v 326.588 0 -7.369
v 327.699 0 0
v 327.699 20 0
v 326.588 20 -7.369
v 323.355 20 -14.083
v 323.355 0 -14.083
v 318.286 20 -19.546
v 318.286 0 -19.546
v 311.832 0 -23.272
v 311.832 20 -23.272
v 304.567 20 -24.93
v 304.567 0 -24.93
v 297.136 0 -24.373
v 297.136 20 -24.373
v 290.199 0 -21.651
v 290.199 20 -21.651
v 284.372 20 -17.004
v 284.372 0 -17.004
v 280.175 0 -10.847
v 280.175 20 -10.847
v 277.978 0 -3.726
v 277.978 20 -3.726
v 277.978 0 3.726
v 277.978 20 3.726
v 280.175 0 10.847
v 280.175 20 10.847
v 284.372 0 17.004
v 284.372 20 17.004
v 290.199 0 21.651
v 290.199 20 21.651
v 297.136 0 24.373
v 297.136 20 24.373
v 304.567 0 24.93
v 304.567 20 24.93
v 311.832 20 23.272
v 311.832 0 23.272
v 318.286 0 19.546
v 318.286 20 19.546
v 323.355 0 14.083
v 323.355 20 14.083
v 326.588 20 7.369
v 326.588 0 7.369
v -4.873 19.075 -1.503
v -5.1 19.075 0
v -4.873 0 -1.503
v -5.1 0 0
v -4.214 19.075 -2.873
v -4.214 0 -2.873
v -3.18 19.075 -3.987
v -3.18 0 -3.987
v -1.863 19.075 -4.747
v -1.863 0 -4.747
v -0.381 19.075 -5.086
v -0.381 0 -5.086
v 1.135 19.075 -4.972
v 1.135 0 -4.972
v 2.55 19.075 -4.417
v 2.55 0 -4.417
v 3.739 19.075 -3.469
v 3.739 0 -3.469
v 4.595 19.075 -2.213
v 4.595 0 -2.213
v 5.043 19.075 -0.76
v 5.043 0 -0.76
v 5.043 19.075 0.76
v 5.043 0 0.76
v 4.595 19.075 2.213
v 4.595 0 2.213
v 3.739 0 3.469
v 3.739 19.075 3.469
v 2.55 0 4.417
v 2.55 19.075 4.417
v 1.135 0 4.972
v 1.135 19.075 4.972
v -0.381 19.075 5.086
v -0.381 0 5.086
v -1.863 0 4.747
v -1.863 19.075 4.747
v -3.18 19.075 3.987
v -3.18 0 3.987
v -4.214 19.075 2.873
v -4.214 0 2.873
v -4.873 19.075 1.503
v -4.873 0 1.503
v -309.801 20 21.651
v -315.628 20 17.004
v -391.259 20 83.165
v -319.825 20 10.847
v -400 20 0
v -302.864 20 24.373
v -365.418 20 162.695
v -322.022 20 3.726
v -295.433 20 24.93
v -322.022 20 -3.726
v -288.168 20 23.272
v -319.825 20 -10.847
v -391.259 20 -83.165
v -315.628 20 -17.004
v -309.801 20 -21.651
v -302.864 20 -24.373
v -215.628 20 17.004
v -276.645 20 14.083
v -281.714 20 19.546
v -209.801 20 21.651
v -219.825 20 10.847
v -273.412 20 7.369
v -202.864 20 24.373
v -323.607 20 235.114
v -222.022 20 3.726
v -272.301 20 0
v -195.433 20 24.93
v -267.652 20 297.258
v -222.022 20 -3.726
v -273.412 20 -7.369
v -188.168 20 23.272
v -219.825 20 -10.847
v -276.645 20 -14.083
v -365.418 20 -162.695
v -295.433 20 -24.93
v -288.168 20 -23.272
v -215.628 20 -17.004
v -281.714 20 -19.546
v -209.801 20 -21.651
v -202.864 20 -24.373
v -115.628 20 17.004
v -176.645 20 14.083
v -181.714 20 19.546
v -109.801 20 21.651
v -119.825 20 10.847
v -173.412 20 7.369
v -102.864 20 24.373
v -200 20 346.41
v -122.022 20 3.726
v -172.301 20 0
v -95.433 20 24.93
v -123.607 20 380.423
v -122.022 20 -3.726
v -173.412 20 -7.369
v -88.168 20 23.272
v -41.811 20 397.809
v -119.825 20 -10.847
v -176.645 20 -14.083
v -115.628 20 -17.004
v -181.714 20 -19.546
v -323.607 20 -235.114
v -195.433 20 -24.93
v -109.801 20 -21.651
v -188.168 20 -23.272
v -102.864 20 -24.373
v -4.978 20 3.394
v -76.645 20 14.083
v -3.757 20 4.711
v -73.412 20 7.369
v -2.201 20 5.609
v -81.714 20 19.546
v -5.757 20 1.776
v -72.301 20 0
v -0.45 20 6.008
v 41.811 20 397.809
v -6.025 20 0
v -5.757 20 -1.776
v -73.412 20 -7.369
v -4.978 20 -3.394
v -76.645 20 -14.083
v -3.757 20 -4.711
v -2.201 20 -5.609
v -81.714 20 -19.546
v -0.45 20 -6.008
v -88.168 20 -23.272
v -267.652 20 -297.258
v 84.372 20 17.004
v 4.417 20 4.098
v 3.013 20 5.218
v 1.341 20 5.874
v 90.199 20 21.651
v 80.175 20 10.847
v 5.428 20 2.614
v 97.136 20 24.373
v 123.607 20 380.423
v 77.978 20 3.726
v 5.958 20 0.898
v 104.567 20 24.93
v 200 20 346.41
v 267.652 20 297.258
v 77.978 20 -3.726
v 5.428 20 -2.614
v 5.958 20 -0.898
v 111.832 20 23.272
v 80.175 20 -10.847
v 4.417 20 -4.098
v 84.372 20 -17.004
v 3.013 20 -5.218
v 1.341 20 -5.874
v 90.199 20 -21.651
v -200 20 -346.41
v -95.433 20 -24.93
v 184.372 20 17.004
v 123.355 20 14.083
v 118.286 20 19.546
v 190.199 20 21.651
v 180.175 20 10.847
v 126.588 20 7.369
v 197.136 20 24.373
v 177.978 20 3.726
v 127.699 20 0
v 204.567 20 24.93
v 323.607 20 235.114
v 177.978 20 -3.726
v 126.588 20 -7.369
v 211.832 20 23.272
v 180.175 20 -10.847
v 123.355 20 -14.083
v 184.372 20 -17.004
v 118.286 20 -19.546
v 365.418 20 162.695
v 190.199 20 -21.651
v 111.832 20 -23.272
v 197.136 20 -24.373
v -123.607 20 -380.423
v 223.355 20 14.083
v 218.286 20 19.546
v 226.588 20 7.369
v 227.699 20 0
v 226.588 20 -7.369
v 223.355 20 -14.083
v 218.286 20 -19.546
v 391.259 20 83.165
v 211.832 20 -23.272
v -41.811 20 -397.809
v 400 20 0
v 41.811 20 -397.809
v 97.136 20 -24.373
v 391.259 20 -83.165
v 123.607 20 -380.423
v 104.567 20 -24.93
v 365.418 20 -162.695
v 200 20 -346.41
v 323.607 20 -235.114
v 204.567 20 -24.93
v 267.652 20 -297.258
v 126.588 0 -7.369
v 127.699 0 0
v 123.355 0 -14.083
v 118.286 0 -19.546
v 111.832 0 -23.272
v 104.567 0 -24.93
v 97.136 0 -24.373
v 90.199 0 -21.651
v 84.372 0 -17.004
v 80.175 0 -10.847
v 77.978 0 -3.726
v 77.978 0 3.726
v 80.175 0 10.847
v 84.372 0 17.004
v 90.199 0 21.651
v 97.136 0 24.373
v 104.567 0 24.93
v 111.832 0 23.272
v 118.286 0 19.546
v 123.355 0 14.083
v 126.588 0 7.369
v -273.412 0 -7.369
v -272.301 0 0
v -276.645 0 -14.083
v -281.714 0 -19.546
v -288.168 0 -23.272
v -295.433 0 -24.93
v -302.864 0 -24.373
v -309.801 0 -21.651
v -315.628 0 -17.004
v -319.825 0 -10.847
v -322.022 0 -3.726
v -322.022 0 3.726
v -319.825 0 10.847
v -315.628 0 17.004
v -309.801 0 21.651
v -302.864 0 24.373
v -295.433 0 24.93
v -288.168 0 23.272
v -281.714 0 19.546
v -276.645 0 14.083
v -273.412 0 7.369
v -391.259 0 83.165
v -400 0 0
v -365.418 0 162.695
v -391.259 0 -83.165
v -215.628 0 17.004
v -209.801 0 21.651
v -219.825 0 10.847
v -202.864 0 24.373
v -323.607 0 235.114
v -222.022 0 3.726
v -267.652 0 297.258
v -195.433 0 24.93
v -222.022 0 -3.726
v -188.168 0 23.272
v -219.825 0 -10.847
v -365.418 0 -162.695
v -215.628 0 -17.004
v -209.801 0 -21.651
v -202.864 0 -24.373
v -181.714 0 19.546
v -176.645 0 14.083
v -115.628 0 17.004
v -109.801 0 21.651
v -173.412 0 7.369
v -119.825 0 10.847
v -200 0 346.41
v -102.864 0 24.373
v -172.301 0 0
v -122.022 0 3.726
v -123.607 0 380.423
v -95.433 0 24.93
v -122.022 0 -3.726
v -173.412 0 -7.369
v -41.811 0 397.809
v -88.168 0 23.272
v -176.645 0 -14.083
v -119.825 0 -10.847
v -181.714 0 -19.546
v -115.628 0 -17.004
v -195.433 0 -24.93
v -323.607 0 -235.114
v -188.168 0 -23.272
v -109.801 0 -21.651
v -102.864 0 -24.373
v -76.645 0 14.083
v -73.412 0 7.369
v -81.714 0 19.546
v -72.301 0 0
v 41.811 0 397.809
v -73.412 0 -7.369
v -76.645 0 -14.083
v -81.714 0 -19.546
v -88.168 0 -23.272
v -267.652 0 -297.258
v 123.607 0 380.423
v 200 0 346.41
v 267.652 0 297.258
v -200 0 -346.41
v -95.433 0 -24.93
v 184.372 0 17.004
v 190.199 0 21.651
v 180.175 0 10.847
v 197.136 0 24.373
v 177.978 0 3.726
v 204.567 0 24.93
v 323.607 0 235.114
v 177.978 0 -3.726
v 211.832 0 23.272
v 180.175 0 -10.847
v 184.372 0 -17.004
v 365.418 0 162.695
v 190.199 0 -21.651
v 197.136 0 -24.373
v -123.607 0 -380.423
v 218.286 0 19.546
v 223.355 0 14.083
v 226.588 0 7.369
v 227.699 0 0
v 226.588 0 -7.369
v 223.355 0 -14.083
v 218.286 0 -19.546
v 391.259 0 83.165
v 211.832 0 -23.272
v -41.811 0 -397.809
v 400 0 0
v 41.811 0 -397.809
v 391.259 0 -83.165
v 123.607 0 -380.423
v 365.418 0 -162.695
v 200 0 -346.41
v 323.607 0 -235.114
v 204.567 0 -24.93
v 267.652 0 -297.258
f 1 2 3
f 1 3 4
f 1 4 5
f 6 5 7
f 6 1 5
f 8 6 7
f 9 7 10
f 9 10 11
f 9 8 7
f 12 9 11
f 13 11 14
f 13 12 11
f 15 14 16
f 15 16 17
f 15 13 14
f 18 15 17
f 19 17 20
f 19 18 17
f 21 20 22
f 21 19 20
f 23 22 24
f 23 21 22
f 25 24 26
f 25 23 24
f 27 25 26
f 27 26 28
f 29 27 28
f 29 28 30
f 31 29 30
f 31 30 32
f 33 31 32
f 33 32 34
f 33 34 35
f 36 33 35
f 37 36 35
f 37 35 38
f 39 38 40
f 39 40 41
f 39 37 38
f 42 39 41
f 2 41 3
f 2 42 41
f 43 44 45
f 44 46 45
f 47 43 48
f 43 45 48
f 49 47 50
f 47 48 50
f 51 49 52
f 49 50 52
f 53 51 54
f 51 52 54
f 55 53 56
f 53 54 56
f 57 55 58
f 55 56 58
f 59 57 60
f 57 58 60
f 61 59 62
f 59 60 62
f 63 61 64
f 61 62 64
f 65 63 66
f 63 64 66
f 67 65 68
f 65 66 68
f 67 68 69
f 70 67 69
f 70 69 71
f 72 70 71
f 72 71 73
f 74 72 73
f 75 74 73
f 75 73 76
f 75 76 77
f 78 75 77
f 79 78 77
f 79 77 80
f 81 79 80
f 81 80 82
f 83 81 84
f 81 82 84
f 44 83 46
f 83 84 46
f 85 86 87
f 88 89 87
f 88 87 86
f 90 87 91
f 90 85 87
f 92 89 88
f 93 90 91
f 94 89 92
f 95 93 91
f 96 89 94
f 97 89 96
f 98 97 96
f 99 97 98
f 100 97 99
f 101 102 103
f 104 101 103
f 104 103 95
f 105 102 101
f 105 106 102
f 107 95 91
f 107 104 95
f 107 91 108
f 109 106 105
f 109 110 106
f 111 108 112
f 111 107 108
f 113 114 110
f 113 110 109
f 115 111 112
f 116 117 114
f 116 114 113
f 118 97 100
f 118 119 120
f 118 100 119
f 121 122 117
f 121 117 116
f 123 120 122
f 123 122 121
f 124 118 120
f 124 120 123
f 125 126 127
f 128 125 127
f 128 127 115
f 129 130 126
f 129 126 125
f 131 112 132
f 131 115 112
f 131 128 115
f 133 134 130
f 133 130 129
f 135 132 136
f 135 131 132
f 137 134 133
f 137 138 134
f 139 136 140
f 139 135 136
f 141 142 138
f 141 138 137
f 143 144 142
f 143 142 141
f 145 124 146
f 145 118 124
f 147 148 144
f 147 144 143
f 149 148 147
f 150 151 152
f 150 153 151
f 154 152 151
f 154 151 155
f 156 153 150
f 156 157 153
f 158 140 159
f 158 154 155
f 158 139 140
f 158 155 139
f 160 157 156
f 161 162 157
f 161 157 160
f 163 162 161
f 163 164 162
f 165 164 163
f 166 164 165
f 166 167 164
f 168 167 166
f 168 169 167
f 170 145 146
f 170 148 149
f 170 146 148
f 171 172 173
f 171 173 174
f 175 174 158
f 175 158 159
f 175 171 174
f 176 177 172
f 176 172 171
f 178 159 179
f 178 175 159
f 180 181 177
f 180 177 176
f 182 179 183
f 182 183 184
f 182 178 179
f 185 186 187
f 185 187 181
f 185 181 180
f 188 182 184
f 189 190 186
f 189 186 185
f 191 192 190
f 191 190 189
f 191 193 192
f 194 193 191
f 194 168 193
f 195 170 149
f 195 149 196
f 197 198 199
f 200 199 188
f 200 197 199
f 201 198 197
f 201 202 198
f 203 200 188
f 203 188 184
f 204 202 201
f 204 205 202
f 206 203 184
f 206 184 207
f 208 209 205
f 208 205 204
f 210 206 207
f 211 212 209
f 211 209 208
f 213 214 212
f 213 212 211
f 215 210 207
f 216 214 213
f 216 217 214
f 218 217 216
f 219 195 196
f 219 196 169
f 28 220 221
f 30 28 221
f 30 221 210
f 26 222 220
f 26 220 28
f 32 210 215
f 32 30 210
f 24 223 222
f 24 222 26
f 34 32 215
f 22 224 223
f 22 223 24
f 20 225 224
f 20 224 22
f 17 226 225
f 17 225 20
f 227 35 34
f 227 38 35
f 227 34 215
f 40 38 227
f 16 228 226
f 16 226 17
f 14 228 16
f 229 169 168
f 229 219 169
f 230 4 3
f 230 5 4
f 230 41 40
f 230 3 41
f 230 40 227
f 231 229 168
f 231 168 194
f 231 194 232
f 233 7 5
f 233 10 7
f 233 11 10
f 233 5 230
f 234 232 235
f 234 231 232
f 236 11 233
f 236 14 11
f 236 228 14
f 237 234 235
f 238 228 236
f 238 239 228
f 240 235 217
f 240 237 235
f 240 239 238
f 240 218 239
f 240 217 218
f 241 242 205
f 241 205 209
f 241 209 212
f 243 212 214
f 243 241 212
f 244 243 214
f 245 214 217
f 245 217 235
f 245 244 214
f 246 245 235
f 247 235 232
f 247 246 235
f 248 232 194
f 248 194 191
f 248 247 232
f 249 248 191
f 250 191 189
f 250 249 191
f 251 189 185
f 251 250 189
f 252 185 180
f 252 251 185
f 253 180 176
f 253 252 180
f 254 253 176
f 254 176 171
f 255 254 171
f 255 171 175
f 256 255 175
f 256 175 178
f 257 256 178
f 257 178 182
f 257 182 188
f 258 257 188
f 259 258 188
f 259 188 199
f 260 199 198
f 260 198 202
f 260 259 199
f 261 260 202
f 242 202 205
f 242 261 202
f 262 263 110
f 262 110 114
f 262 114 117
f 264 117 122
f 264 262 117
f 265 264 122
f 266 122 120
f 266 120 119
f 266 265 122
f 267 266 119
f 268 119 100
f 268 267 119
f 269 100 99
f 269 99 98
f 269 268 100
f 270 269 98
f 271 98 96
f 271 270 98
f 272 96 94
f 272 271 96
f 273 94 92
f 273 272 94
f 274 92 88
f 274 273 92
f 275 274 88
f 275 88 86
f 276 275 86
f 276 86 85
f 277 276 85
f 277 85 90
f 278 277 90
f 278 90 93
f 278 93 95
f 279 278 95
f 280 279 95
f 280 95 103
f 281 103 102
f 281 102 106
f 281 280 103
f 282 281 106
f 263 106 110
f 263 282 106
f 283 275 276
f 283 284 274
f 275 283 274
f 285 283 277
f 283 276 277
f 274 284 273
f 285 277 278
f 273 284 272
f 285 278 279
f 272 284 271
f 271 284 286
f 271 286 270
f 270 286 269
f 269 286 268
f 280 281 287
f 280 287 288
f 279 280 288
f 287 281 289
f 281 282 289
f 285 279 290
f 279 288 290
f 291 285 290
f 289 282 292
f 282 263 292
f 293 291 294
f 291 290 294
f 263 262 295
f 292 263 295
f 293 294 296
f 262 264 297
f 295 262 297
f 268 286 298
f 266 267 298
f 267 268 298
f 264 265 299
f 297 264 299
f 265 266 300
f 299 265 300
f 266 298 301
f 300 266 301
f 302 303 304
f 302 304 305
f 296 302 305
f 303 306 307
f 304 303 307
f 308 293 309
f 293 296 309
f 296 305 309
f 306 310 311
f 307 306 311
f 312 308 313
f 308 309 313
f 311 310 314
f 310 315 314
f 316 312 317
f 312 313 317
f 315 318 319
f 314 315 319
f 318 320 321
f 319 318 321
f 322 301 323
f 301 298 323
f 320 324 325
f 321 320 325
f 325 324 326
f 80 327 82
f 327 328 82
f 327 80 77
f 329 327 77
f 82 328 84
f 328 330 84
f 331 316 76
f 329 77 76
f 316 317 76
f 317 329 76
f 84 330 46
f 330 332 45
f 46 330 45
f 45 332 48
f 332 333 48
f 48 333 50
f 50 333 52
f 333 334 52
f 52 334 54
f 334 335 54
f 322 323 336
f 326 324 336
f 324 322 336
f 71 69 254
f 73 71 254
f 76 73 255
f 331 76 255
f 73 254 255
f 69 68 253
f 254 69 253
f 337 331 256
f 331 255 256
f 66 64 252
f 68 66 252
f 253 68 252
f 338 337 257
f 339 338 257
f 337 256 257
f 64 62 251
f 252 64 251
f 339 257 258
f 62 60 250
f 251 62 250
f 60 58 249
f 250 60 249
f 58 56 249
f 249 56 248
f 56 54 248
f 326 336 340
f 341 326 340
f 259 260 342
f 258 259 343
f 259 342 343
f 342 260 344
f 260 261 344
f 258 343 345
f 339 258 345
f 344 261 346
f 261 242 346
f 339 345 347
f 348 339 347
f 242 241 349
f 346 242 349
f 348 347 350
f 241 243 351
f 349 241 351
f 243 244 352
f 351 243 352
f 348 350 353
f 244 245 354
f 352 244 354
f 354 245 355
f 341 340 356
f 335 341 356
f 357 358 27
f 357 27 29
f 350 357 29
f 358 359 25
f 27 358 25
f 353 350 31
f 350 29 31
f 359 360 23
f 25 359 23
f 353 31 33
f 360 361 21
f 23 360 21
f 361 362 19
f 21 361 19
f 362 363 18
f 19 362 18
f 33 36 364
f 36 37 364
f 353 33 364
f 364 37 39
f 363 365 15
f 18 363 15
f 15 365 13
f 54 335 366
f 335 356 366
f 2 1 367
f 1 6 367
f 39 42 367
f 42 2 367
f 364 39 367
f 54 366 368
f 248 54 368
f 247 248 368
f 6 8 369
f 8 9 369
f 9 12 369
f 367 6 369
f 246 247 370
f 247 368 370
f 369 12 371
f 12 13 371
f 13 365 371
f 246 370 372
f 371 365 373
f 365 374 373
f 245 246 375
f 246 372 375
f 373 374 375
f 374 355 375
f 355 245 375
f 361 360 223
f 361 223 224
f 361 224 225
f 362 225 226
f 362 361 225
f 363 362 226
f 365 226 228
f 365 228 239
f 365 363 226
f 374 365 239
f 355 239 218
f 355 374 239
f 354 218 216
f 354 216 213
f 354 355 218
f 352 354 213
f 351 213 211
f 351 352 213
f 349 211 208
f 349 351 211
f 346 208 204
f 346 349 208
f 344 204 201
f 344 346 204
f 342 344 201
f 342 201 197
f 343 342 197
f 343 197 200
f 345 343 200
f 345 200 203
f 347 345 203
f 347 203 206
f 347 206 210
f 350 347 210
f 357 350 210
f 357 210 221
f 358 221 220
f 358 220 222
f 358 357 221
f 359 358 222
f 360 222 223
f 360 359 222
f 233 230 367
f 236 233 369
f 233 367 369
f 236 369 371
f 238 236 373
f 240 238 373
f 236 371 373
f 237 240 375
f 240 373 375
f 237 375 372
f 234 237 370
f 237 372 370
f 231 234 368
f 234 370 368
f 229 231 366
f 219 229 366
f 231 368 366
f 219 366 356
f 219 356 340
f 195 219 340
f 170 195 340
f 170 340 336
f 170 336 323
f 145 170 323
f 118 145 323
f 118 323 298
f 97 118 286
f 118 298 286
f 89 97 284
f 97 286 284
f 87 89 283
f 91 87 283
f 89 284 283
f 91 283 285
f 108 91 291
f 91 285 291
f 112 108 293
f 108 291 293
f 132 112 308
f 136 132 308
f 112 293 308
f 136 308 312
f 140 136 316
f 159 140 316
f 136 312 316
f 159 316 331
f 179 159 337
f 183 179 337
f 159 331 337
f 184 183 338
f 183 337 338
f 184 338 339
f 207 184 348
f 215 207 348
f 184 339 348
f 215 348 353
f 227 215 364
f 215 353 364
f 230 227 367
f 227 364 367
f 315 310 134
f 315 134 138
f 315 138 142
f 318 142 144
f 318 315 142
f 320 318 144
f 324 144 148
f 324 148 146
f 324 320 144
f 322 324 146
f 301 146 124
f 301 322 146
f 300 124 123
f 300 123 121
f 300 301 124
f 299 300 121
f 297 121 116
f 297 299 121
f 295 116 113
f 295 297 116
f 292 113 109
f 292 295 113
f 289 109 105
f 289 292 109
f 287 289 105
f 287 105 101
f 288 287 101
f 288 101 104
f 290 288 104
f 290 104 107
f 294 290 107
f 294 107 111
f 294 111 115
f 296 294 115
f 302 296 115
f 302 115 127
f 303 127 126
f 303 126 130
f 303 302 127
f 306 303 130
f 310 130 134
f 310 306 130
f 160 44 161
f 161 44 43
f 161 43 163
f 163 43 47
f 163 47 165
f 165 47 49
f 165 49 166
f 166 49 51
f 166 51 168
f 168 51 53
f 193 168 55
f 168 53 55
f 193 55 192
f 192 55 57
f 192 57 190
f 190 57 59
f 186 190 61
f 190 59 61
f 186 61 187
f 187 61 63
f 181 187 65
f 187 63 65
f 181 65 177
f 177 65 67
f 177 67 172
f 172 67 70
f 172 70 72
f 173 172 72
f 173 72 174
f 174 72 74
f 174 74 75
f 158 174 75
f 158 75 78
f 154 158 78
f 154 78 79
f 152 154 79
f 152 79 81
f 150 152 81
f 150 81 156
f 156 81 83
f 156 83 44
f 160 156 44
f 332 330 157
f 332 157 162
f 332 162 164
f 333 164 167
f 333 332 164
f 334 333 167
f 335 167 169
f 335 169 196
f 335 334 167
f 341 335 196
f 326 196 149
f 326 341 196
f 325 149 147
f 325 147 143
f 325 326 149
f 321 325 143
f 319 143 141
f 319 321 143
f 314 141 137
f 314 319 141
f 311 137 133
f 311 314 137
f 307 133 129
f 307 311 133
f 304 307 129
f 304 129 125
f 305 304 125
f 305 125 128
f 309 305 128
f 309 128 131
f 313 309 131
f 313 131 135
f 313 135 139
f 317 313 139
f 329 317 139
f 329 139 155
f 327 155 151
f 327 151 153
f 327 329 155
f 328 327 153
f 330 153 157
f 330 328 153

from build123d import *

# Parameters (mm, degrees)
SKETCH1_R                    = 400
BOSS_EXTRUDE1_DEPTH          = 20
SKETCH2_R                    = 25
CUT_EXTRUDE3_DEPTH           = 20
M12_TAPPED_HOLE1_D           = 10.2
M12_TAPPED_HOLE1_DEPTH       = 32.75
M12_TAPPED_HOLE1_CSINK_D     = 12.05
M12_TAPPED_HOLE1_CSINK_ANGLE = 90
M12_TAPPED_HOLE1_TIP         = 3.064389157


with BuildPart() as part:
    # Sketch1 → Boss-Extrude1 (new body)
    with BuildSketch(Plane(origin=(0, 0, 0), x_dir=(1, 0, 0), z_dir=(0, 1, 0))):
        Circle(SKETCH1_R)
    extrude(amount=BOSS_EXTRUDE1_DEPTH)

    # Sketch2 → Cut-Extrude3 (cut)
    with BuildSketch(Plane(origin=(0, 0, 0), x_dir=(1, 0, 0), z_dir=(0, 1, 0))):
        with Locations((102.698747746, 0)):
            Circle(SKETCH2_R)
        with Locations((202.698747746, 0)):
            Circle(SKETCH2_R)
        with Locations((302.698747746, 0)):
            Circle(SKETCH2_R)
        with Locations((-97.301252254, 0)):
            Circle(SKETCH2_R)
        with Locations((-197.301252254, 0)):
            Circle(SKETCH2_R)
        with Locations((-297.301252254, 0)):
            Circle(SKETCH2_R)
    extrude(amount=CUT_EXTRUDE3_DEPTH, mode=Mode.SUBTRACT)

    # M12 Tapped Hole1
    with Locations(Plane(origin=(0, 20, 0), x_dir=(1, 0, 0), z_dir=(0, 1, 0))):
        with Locations((0, 0)):
            CounterSinkHole(M12_TAPPED_HOLE1_D / 2, M12_TAPPED_HOLE1_CSINK_D / 2, depth=M12_TAPPED_HOLE1_DEPTH, counter_sink_angle=M12_TAPPED_HOLE1_CSINK_ANGLE)
            with Locations((0, 0, -(M12_TAPPED_HOLE1_DEPTH + M12_TAPPED_HOLE1_TIP / 2))):  # 118° drill point
                Cone(0, M12_TAPPED_HOLE1_D / 2, M12_TAPPED_HOLE1_TIP, mode=Mode.SUBTRACT)


solid = part.part
